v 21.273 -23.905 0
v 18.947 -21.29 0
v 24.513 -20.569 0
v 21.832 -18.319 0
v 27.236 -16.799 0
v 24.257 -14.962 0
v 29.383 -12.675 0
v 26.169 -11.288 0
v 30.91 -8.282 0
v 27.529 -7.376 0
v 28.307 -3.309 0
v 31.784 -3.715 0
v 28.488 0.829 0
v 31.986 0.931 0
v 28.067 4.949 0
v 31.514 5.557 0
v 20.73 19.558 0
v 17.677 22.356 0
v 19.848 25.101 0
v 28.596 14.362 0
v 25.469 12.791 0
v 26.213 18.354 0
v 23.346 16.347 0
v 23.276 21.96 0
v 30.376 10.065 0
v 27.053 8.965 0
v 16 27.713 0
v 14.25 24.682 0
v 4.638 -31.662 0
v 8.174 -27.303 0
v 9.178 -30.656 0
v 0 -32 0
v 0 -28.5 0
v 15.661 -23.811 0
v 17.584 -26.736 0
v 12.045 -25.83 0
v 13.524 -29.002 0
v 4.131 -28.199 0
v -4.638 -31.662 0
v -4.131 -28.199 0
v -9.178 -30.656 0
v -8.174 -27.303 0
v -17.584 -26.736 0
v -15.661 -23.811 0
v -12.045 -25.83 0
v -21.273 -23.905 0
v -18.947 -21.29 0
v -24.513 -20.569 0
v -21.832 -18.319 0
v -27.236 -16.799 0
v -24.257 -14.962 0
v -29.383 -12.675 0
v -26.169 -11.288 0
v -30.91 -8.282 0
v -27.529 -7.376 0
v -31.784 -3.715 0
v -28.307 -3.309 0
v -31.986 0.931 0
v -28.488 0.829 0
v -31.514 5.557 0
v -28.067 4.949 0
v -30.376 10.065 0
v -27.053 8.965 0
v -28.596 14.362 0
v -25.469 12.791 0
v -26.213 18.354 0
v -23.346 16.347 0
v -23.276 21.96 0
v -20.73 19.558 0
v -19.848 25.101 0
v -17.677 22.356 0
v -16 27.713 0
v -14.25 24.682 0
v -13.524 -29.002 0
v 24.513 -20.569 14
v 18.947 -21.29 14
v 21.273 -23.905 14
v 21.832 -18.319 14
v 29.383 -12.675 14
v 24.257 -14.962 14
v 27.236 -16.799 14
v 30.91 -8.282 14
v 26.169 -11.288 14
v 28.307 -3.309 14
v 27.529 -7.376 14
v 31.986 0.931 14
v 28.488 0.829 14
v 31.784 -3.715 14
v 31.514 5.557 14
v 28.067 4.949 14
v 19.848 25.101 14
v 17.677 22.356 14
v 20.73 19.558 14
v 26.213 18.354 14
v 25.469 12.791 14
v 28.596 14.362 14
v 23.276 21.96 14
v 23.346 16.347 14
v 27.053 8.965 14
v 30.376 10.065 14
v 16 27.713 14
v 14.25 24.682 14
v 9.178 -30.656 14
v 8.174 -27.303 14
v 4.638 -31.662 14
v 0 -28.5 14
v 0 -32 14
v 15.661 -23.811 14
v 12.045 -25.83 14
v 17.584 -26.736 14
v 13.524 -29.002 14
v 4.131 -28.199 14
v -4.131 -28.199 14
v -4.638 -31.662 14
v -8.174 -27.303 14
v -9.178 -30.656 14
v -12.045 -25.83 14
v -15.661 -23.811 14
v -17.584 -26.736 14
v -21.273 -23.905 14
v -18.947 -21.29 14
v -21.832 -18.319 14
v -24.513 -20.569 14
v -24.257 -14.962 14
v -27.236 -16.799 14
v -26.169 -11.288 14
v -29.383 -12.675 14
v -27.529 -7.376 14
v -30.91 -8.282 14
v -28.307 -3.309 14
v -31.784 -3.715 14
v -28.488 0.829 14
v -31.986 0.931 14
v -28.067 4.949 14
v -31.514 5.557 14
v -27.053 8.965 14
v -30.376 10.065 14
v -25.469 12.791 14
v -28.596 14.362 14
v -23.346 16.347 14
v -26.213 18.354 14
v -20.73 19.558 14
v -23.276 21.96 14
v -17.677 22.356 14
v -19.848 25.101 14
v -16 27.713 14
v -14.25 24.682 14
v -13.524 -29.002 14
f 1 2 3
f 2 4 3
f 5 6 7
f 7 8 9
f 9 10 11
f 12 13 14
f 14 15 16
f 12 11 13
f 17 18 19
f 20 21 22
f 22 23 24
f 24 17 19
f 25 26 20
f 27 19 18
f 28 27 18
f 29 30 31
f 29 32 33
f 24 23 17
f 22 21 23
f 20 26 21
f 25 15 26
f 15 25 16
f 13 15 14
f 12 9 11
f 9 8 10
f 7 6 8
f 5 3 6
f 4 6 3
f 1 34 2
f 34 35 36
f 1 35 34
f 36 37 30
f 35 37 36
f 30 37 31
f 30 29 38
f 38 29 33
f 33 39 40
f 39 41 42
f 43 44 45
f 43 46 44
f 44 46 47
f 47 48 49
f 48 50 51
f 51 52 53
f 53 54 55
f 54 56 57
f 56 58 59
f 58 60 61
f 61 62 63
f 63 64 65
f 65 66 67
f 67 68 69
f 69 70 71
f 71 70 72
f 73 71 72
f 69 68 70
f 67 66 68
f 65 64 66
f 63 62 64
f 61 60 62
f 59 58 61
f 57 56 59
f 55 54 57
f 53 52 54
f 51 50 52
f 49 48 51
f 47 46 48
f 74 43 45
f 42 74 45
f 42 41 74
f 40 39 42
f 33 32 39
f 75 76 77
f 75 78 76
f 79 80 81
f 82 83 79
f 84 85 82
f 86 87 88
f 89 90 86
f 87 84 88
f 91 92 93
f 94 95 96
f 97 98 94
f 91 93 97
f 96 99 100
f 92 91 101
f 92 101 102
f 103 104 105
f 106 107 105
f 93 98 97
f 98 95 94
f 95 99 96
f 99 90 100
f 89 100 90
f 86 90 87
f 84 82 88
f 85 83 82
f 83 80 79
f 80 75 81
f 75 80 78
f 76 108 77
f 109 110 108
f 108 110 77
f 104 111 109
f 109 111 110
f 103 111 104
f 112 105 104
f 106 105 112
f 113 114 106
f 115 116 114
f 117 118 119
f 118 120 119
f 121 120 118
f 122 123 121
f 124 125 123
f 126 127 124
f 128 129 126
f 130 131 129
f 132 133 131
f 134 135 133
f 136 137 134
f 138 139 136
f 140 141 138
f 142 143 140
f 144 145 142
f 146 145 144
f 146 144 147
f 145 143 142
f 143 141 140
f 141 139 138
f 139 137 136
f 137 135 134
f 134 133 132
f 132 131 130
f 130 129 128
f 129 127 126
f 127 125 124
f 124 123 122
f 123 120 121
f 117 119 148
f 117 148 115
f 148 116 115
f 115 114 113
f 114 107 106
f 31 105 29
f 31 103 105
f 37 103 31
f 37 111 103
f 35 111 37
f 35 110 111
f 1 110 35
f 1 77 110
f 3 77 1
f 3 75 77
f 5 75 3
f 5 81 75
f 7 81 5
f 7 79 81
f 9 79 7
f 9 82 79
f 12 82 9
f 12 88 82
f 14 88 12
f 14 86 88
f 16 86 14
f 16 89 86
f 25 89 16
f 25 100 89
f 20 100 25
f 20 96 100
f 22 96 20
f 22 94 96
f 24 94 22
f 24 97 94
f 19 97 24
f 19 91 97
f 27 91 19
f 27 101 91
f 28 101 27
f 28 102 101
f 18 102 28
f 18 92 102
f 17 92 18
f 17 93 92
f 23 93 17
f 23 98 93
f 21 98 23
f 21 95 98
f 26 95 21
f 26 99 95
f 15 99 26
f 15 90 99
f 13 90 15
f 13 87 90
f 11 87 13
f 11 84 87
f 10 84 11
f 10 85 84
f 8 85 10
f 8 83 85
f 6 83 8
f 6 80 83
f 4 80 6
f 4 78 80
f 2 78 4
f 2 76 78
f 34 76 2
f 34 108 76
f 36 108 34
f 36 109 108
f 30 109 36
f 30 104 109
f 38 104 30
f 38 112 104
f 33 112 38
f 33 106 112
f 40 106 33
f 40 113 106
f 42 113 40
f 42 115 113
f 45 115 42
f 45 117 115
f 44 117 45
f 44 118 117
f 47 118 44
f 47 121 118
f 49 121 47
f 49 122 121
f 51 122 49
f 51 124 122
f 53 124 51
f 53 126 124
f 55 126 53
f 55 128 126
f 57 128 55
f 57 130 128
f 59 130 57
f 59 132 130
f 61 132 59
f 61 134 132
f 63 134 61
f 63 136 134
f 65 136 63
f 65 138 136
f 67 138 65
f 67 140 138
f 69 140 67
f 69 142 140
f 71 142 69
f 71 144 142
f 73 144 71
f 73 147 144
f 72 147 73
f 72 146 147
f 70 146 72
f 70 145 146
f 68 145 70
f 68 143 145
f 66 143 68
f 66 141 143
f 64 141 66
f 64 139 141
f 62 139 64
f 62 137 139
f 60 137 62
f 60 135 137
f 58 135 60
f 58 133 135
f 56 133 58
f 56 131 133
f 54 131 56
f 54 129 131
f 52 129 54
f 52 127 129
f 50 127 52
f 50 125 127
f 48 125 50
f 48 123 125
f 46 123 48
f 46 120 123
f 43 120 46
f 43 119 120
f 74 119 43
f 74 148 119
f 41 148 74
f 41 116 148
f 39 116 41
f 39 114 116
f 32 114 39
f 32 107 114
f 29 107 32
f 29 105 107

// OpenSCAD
$fn = 32;

// ----------------------------------------------------------------------
// Spring clip: 64 mm outside, 3.5 mm band, 60 degree opening
// ----------------------------------------------------------------------

// --- parameters (mm) ---
outer_r = 32;             // clip outside radius
inner_r = 28.5;           // clip bore radius
band = 3.5;               // band thickness
clip_w = 14;              // clip width
opening = 60;             // opening angle

clip_profile = [[-16, 27.713], [-19.848, 25.101], [-23.276, 21.96], [-26.213, 18.354], [-28.596, 14.362], [-30.376, 10.065], [-31.514, 5.557], [-31.986, 0.931], [-31.784, -3.715], [-30.91, -8.282], [-29.383, -12.675], [-27.236, -16.799], [-24.513, -20.569], [-21.273, -23.905], [-17.584, -26.736], [-13.524, -29.002], [-9.178, -30.656], [-4.638, -31.662], [0, -32], [4.638, -31.662], [9.178, -30.656], [13.524, -29.002], [17.584, -26.736], [21.273, -23.905], [24.513, -20.569], [27.236, -16.799], [29.383, -12.675], [30.91, -8.282], [31.784, -3.715], [31.986, 0.931], [31.514, 5.557], [30.376, 10.065], [28.596, 14.362], [26.213, 18.354], [23.276, 21.96], [19.848, 25.101], [16, 27.713], [14.25, 24.682], [17.677, 22.356], [20.73, 19.558], [23.346, 16.347], [25.469, 12.791], [27.053, 8.965], [28.067, 4.949], [28.488, 0.829], [28.307, -3.309], [27.529, -7.376], [26.169, -11.288], [24.257, -14.962], [21.832, -18.319], [18.947, -21.29], [15.661, -23.811], [12.045, -25.83], [8.174, -27.303], [4.131, -28.199], [0, -28.5], [-4.131, -28.199], [-8.174, -27.303], [-12.045, -25.83], [-15.661, -23.811], [-18.947, -21.29], [-21.832, -18.319], [-24.257, -14.962], [-26.169, -11.288], [-27.529, -7.376], [-28.307, -3.309], [-28.488, 0.829], [-28.067, 4.949], [-27.053, 8.965], [-25.469, 12.791], [-23.346, 16.347], [-20.73, 19.558], [-17.677, 22.356], [-14.25, 24.682]];

difference() {
  union() {
    linear_extrude(height = clip_w) polygon(clip_profile);
  }
}
